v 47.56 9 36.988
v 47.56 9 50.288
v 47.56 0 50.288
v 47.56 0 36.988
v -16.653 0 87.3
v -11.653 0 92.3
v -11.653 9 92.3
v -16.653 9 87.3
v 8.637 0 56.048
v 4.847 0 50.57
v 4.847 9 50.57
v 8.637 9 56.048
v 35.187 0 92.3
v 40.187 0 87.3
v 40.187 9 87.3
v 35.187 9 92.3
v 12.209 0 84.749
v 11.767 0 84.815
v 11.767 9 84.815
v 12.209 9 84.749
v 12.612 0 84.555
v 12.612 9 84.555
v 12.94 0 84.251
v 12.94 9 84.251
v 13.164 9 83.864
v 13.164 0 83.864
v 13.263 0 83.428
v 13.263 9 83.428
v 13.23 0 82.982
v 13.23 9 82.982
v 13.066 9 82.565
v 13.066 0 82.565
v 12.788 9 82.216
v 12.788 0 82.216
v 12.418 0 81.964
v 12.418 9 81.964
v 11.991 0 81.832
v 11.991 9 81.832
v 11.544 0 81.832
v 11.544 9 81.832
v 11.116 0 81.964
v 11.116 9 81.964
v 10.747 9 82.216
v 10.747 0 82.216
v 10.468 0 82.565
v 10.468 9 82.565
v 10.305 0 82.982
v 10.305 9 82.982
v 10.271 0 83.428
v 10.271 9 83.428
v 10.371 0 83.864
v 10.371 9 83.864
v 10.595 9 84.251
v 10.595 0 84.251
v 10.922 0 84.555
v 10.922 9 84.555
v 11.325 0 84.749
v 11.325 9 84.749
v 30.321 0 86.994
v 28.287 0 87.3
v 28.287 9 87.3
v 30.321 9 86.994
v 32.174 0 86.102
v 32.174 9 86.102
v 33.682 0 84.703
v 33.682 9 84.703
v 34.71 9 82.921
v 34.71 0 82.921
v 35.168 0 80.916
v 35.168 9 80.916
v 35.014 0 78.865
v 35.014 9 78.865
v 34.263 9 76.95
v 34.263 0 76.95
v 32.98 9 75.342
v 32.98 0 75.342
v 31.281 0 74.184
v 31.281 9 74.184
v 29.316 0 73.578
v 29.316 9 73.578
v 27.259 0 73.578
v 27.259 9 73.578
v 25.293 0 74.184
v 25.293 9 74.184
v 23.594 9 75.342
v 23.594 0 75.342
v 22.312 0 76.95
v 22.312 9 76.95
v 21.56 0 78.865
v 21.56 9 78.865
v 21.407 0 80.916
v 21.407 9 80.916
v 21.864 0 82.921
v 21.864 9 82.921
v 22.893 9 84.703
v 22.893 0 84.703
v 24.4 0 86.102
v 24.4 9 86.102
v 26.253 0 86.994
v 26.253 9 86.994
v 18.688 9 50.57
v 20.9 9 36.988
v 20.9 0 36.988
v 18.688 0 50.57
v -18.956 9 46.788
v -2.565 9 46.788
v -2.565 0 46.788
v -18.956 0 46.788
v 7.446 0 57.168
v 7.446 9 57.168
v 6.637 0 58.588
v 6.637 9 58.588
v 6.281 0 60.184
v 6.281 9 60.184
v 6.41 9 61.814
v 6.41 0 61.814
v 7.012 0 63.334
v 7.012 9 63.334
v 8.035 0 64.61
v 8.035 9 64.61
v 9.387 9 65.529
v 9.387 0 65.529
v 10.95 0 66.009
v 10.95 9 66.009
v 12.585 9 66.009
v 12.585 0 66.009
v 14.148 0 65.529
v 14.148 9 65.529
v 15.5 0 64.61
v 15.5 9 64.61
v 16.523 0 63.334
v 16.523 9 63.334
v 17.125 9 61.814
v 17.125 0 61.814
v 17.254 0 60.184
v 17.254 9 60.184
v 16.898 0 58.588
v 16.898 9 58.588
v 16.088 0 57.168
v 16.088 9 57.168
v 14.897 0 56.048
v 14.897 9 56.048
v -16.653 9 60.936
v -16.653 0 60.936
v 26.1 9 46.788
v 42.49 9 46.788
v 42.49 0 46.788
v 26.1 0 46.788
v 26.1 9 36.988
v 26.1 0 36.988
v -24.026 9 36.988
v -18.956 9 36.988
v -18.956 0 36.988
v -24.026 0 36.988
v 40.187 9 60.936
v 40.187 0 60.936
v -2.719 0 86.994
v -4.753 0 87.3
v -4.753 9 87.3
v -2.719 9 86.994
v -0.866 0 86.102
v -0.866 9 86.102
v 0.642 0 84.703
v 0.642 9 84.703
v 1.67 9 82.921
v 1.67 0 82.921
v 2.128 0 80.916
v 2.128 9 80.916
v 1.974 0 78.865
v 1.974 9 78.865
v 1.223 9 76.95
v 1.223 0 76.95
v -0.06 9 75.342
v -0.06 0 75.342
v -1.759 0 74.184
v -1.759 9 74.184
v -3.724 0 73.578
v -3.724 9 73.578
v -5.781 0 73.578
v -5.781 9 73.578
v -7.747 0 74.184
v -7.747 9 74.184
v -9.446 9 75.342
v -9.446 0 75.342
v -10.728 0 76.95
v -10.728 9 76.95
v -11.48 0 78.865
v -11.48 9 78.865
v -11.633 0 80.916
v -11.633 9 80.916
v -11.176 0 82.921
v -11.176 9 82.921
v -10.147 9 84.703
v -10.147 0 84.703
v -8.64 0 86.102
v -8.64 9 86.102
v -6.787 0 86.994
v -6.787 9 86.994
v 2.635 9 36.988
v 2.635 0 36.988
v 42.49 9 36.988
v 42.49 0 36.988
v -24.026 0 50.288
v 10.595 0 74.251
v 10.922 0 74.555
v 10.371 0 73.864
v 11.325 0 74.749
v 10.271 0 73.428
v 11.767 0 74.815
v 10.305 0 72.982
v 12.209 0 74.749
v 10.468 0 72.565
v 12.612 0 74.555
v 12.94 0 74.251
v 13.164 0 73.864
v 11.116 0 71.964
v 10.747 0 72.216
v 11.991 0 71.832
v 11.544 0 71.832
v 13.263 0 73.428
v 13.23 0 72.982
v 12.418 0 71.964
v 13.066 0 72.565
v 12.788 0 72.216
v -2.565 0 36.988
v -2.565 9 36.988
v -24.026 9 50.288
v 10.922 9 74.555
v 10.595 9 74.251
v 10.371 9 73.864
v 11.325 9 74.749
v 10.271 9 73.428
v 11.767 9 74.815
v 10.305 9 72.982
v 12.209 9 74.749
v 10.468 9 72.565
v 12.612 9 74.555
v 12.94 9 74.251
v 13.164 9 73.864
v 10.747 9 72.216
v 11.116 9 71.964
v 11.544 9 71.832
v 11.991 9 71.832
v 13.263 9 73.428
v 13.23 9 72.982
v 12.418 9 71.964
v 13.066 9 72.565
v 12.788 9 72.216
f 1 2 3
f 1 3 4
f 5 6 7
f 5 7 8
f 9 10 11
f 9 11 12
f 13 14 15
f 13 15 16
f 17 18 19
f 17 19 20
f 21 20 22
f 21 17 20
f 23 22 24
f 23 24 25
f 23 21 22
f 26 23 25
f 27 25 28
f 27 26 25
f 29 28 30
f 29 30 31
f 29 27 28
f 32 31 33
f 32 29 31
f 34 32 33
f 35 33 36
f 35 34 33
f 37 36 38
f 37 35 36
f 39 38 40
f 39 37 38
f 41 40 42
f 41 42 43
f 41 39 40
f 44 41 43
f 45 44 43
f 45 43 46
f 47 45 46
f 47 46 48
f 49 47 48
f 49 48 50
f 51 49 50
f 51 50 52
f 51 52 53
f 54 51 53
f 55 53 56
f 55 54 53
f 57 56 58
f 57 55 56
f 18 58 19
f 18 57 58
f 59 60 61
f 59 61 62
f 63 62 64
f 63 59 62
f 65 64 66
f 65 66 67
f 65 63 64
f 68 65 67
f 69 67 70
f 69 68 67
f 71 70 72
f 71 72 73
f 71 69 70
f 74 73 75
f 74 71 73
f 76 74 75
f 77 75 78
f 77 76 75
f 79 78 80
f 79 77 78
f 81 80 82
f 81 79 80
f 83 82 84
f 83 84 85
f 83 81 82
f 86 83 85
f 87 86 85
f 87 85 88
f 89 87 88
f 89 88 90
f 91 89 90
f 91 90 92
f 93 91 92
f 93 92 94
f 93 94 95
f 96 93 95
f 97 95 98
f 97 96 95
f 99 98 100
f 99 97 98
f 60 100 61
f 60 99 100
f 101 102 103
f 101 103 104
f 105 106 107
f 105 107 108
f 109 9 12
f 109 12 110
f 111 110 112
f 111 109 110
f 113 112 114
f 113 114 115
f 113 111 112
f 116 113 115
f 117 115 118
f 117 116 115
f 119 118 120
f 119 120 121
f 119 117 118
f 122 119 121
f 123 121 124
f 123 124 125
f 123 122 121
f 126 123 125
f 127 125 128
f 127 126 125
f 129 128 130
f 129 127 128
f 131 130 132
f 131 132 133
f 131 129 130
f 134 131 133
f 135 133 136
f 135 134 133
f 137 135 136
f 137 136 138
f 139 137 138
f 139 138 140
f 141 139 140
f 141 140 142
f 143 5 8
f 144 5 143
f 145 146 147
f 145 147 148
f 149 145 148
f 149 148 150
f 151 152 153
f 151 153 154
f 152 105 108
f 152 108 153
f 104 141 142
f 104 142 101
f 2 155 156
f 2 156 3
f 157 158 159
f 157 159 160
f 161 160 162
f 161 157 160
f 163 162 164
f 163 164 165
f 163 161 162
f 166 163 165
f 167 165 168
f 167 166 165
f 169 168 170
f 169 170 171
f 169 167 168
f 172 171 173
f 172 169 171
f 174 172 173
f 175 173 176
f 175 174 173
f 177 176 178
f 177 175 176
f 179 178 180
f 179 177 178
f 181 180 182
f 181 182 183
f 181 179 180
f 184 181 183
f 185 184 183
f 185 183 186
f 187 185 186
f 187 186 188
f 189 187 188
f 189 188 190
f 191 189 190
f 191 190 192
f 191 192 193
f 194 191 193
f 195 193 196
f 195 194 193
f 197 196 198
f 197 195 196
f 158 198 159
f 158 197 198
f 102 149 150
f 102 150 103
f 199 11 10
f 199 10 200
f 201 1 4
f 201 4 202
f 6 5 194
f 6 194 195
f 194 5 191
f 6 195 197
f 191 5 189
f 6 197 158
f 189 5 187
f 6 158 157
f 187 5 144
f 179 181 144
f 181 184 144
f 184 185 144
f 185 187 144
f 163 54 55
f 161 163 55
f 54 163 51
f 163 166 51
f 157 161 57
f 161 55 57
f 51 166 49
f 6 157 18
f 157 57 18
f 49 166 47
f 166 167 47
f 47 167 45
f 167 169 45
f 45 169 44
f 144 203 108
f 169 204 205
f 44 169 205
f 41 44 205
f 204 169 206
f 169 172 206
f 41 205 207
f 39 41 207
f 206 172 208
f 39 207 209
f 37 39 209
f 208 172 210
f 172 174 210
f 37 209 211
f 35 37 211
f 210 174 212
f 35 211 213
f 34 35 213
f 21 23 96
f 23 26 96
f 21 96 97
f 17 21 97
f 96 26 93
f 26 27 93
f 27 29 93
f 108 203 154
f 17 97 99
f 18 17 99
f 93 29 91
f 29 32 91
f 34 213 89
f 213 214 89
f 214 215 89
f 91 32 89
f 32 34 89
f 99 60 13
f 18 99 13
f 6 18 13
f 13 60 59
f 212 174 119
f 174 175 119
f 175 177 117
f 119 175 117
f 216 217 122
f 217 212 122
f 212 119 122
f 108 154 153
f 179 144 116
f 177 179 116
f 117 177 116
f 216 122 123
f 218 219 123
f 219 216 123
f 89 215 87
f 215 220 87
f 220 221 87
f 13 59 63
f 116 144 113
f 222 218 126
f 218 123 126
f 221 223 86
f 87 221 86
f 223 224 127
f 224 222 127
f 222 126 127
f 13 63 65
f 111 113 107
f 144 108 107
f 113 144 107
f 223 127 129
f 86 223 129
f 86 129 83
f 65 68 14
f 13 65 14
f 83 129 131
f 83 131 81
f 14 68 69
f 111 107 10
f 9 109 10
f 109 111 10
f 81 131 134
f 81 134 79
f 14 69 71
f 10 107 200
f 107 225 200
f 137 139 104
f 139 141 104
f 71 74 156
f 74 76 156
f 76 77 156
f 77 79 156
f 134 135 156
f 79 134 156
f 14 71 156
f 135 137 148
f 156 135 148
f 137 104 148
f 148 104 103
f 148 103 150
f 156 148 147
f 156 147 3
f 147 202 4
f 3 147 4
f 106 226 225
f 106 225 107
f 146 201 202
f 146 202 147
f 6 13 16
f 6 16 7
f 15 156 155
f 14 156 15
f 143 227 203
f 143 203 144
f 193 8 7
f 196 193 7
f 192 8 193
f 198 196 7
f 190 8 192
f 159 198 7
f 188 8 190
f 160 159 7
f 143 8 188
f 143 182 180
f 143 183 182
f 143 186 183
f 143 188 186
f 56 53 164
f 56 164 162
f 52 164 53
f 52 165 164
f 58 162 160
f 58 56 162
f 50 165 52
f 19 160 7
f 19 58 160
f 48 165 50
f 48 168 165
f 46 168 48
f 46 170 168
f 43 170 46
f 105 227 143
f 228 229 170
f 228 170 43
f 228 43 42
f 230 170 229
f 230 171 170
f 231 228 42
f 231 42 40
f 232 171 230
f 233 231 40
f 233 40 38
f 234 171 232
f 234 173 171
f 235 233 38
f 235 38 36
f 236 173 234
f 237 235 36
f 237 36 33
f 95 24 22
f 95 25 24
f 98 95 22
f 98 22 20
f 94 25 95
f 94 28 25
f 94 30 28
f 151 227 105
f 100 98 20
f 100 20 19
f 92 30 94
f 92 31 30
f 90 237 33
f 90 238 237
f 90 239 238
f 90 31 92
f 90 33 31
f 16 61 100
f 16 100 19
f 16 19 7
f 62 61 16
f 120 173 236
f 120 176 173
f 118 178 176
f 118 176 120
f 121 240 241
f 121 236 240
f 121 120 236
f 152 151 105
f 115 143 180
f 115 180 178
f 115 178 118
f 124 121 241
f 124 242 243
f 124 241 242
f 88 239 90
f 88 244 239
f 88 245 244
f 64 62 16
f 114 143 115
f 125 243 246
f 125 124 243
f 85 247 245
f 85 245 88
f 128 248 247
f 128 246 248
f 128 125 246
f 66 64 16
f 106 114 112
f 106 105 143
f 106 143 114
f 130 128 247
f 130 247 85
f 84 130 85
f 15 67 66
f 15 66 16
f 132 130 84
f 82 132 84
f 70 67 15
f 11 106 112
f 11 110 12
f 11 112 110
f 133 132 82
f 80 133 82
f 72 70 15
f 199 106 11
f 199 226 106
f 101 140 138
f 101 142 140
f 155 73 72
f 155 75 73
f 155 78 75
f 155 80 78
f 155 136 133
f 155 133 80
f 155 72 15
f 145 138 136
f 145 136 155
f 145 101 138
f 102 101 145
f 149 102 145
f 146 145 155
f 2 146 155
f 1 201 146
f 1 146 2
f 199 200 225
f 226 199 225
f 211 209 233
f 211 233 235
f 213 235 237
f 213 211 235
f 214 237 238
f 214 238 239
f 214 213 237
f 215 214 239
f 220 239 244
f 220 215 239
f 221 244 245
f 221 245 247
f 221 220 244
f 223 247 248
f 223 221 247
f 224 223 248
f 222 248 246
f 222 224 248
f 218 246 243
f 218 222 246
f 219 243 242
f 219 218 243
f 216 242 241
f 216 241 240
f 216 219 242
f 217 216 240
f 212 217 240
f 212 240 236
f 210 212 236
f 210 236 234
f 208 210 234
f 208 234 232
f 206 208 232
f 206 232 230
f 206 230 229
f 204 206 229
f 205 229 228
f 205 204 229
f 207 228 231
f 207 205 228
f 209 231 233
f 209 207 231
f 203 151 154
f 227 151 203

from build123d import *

# Parameters (mm, degrees)
SKETCH1_R           = 1.5
SKETCH1_R_2         = 6.9
BOSS_EXTRUDE1_DEPTH = 9
BOSS_EXTRUDE2_DEPTH = 9


with BuildPart() as part:
    # Sketch1 → Boss-Extrude1 (new body)
    with BuildSketch(Plane(origin=(0, 0, 0), x_dir=(1, 0, 0), z_dir=(0, 1, 0))):
        with BuildLine():
            Line((-11.652723828, -50.570490945), (4.846773171, -50.570490945))
            Line((4.846773171, -50.570490945), (8.637408256, -56.047889168))
            ThreePointArc((8.637408256, -56.047889168), (11.767276172, -66.070490945), (14.897144088, -56.047889168))
            Line((14.897144088, -56.047889168), (18.687779173, -50.570490945))
            Line((18.687779173, -50.570490945), (35.187276172, -50.570490945))
            Line((35.187276172, -50.570490945), (40.187276172, -55.570490945))
            Line((40.187276172, -55.570490945), (40.187276172, -87.300490945))
            Line((40.187276172, -87.300490945), (35.187276172, -92.300490945))
            Line((35.187276172, -92.300490945), (-11.652723828, -92.300490945))
            Line((-11.652723828, -92.300490945), (-16.652723828, -87.300490945))
            Line((-16.652723828, -87.300490945), (-16.652723828, -55.570490945))
            Line((-16.652723828, -55.570490945), (-11.652723828, -50.570490945))
        make_face()
        with Locations(Location((11.767276172, -73.315490945, 0), (0, 0, 270))):
            Circle(SKETCH1_R, mode=Mode.SUBTRACT)
        with Locations(Location((11.767276172, -83.315490945, 0), (0, 0, 270))):
            Circle(SKETCH1_R, mode=Mode.SUBTRACT)
        with Locations(Location((-4.752723828, -80.400490945, 0), (0, 0, 270))):
            Circle(SKETCH1_R_2, mode=Mode.SUBTRACT)
        with Locations(Location((28.287276172, -80.400490945, 0), (0, 0, 270))):
            Circle(SKETCH1_R_2, mode=Mode.SUBTRACT)
    extrude(amount=BOSS_EXTRUDE1_DEPTH)

    # Sketch2 → Boss-Extrude2 (add)
    with BuildSketch(Plane(origin=(0, 9, 0), x_dir=(1, 0, 0), z_dir=(0, 1, 0))):
        Polygon((26.099816941, -36.988069685), (20.899816941, -36.988069685), (18.687779173, -50.570490945), (35.187276172, -50.570490945), (40.187276172, -55.570490945), (40.187276172, -60.936255598), (47.560429658, -50.288069685), (47.560429658, -36.988069685), (42.490429658, -36.988069685), (42.490429658, -46.788069685), (26.099816941, -46.788069685), align=None)
        Polygon((-18.955877314, -36.988069685), (-24.025877314, -36.988069685), (-24.025877314, -50.288069685), (-16.652723828, -60.936255598), (-16.652723828, -55.570490945), (-11.652723828, -50.570490945), (4.846773171, -50.570490945), (2.634735403, -36.988069685), (-2.565264597, -36.988069685), (-2.565264597, -46.788069685), (-18.955877314, -46.788069685), align=None)
    extrude(amount=-BOSS_EXTRUDE2_DEPTH)


solid = part.part
